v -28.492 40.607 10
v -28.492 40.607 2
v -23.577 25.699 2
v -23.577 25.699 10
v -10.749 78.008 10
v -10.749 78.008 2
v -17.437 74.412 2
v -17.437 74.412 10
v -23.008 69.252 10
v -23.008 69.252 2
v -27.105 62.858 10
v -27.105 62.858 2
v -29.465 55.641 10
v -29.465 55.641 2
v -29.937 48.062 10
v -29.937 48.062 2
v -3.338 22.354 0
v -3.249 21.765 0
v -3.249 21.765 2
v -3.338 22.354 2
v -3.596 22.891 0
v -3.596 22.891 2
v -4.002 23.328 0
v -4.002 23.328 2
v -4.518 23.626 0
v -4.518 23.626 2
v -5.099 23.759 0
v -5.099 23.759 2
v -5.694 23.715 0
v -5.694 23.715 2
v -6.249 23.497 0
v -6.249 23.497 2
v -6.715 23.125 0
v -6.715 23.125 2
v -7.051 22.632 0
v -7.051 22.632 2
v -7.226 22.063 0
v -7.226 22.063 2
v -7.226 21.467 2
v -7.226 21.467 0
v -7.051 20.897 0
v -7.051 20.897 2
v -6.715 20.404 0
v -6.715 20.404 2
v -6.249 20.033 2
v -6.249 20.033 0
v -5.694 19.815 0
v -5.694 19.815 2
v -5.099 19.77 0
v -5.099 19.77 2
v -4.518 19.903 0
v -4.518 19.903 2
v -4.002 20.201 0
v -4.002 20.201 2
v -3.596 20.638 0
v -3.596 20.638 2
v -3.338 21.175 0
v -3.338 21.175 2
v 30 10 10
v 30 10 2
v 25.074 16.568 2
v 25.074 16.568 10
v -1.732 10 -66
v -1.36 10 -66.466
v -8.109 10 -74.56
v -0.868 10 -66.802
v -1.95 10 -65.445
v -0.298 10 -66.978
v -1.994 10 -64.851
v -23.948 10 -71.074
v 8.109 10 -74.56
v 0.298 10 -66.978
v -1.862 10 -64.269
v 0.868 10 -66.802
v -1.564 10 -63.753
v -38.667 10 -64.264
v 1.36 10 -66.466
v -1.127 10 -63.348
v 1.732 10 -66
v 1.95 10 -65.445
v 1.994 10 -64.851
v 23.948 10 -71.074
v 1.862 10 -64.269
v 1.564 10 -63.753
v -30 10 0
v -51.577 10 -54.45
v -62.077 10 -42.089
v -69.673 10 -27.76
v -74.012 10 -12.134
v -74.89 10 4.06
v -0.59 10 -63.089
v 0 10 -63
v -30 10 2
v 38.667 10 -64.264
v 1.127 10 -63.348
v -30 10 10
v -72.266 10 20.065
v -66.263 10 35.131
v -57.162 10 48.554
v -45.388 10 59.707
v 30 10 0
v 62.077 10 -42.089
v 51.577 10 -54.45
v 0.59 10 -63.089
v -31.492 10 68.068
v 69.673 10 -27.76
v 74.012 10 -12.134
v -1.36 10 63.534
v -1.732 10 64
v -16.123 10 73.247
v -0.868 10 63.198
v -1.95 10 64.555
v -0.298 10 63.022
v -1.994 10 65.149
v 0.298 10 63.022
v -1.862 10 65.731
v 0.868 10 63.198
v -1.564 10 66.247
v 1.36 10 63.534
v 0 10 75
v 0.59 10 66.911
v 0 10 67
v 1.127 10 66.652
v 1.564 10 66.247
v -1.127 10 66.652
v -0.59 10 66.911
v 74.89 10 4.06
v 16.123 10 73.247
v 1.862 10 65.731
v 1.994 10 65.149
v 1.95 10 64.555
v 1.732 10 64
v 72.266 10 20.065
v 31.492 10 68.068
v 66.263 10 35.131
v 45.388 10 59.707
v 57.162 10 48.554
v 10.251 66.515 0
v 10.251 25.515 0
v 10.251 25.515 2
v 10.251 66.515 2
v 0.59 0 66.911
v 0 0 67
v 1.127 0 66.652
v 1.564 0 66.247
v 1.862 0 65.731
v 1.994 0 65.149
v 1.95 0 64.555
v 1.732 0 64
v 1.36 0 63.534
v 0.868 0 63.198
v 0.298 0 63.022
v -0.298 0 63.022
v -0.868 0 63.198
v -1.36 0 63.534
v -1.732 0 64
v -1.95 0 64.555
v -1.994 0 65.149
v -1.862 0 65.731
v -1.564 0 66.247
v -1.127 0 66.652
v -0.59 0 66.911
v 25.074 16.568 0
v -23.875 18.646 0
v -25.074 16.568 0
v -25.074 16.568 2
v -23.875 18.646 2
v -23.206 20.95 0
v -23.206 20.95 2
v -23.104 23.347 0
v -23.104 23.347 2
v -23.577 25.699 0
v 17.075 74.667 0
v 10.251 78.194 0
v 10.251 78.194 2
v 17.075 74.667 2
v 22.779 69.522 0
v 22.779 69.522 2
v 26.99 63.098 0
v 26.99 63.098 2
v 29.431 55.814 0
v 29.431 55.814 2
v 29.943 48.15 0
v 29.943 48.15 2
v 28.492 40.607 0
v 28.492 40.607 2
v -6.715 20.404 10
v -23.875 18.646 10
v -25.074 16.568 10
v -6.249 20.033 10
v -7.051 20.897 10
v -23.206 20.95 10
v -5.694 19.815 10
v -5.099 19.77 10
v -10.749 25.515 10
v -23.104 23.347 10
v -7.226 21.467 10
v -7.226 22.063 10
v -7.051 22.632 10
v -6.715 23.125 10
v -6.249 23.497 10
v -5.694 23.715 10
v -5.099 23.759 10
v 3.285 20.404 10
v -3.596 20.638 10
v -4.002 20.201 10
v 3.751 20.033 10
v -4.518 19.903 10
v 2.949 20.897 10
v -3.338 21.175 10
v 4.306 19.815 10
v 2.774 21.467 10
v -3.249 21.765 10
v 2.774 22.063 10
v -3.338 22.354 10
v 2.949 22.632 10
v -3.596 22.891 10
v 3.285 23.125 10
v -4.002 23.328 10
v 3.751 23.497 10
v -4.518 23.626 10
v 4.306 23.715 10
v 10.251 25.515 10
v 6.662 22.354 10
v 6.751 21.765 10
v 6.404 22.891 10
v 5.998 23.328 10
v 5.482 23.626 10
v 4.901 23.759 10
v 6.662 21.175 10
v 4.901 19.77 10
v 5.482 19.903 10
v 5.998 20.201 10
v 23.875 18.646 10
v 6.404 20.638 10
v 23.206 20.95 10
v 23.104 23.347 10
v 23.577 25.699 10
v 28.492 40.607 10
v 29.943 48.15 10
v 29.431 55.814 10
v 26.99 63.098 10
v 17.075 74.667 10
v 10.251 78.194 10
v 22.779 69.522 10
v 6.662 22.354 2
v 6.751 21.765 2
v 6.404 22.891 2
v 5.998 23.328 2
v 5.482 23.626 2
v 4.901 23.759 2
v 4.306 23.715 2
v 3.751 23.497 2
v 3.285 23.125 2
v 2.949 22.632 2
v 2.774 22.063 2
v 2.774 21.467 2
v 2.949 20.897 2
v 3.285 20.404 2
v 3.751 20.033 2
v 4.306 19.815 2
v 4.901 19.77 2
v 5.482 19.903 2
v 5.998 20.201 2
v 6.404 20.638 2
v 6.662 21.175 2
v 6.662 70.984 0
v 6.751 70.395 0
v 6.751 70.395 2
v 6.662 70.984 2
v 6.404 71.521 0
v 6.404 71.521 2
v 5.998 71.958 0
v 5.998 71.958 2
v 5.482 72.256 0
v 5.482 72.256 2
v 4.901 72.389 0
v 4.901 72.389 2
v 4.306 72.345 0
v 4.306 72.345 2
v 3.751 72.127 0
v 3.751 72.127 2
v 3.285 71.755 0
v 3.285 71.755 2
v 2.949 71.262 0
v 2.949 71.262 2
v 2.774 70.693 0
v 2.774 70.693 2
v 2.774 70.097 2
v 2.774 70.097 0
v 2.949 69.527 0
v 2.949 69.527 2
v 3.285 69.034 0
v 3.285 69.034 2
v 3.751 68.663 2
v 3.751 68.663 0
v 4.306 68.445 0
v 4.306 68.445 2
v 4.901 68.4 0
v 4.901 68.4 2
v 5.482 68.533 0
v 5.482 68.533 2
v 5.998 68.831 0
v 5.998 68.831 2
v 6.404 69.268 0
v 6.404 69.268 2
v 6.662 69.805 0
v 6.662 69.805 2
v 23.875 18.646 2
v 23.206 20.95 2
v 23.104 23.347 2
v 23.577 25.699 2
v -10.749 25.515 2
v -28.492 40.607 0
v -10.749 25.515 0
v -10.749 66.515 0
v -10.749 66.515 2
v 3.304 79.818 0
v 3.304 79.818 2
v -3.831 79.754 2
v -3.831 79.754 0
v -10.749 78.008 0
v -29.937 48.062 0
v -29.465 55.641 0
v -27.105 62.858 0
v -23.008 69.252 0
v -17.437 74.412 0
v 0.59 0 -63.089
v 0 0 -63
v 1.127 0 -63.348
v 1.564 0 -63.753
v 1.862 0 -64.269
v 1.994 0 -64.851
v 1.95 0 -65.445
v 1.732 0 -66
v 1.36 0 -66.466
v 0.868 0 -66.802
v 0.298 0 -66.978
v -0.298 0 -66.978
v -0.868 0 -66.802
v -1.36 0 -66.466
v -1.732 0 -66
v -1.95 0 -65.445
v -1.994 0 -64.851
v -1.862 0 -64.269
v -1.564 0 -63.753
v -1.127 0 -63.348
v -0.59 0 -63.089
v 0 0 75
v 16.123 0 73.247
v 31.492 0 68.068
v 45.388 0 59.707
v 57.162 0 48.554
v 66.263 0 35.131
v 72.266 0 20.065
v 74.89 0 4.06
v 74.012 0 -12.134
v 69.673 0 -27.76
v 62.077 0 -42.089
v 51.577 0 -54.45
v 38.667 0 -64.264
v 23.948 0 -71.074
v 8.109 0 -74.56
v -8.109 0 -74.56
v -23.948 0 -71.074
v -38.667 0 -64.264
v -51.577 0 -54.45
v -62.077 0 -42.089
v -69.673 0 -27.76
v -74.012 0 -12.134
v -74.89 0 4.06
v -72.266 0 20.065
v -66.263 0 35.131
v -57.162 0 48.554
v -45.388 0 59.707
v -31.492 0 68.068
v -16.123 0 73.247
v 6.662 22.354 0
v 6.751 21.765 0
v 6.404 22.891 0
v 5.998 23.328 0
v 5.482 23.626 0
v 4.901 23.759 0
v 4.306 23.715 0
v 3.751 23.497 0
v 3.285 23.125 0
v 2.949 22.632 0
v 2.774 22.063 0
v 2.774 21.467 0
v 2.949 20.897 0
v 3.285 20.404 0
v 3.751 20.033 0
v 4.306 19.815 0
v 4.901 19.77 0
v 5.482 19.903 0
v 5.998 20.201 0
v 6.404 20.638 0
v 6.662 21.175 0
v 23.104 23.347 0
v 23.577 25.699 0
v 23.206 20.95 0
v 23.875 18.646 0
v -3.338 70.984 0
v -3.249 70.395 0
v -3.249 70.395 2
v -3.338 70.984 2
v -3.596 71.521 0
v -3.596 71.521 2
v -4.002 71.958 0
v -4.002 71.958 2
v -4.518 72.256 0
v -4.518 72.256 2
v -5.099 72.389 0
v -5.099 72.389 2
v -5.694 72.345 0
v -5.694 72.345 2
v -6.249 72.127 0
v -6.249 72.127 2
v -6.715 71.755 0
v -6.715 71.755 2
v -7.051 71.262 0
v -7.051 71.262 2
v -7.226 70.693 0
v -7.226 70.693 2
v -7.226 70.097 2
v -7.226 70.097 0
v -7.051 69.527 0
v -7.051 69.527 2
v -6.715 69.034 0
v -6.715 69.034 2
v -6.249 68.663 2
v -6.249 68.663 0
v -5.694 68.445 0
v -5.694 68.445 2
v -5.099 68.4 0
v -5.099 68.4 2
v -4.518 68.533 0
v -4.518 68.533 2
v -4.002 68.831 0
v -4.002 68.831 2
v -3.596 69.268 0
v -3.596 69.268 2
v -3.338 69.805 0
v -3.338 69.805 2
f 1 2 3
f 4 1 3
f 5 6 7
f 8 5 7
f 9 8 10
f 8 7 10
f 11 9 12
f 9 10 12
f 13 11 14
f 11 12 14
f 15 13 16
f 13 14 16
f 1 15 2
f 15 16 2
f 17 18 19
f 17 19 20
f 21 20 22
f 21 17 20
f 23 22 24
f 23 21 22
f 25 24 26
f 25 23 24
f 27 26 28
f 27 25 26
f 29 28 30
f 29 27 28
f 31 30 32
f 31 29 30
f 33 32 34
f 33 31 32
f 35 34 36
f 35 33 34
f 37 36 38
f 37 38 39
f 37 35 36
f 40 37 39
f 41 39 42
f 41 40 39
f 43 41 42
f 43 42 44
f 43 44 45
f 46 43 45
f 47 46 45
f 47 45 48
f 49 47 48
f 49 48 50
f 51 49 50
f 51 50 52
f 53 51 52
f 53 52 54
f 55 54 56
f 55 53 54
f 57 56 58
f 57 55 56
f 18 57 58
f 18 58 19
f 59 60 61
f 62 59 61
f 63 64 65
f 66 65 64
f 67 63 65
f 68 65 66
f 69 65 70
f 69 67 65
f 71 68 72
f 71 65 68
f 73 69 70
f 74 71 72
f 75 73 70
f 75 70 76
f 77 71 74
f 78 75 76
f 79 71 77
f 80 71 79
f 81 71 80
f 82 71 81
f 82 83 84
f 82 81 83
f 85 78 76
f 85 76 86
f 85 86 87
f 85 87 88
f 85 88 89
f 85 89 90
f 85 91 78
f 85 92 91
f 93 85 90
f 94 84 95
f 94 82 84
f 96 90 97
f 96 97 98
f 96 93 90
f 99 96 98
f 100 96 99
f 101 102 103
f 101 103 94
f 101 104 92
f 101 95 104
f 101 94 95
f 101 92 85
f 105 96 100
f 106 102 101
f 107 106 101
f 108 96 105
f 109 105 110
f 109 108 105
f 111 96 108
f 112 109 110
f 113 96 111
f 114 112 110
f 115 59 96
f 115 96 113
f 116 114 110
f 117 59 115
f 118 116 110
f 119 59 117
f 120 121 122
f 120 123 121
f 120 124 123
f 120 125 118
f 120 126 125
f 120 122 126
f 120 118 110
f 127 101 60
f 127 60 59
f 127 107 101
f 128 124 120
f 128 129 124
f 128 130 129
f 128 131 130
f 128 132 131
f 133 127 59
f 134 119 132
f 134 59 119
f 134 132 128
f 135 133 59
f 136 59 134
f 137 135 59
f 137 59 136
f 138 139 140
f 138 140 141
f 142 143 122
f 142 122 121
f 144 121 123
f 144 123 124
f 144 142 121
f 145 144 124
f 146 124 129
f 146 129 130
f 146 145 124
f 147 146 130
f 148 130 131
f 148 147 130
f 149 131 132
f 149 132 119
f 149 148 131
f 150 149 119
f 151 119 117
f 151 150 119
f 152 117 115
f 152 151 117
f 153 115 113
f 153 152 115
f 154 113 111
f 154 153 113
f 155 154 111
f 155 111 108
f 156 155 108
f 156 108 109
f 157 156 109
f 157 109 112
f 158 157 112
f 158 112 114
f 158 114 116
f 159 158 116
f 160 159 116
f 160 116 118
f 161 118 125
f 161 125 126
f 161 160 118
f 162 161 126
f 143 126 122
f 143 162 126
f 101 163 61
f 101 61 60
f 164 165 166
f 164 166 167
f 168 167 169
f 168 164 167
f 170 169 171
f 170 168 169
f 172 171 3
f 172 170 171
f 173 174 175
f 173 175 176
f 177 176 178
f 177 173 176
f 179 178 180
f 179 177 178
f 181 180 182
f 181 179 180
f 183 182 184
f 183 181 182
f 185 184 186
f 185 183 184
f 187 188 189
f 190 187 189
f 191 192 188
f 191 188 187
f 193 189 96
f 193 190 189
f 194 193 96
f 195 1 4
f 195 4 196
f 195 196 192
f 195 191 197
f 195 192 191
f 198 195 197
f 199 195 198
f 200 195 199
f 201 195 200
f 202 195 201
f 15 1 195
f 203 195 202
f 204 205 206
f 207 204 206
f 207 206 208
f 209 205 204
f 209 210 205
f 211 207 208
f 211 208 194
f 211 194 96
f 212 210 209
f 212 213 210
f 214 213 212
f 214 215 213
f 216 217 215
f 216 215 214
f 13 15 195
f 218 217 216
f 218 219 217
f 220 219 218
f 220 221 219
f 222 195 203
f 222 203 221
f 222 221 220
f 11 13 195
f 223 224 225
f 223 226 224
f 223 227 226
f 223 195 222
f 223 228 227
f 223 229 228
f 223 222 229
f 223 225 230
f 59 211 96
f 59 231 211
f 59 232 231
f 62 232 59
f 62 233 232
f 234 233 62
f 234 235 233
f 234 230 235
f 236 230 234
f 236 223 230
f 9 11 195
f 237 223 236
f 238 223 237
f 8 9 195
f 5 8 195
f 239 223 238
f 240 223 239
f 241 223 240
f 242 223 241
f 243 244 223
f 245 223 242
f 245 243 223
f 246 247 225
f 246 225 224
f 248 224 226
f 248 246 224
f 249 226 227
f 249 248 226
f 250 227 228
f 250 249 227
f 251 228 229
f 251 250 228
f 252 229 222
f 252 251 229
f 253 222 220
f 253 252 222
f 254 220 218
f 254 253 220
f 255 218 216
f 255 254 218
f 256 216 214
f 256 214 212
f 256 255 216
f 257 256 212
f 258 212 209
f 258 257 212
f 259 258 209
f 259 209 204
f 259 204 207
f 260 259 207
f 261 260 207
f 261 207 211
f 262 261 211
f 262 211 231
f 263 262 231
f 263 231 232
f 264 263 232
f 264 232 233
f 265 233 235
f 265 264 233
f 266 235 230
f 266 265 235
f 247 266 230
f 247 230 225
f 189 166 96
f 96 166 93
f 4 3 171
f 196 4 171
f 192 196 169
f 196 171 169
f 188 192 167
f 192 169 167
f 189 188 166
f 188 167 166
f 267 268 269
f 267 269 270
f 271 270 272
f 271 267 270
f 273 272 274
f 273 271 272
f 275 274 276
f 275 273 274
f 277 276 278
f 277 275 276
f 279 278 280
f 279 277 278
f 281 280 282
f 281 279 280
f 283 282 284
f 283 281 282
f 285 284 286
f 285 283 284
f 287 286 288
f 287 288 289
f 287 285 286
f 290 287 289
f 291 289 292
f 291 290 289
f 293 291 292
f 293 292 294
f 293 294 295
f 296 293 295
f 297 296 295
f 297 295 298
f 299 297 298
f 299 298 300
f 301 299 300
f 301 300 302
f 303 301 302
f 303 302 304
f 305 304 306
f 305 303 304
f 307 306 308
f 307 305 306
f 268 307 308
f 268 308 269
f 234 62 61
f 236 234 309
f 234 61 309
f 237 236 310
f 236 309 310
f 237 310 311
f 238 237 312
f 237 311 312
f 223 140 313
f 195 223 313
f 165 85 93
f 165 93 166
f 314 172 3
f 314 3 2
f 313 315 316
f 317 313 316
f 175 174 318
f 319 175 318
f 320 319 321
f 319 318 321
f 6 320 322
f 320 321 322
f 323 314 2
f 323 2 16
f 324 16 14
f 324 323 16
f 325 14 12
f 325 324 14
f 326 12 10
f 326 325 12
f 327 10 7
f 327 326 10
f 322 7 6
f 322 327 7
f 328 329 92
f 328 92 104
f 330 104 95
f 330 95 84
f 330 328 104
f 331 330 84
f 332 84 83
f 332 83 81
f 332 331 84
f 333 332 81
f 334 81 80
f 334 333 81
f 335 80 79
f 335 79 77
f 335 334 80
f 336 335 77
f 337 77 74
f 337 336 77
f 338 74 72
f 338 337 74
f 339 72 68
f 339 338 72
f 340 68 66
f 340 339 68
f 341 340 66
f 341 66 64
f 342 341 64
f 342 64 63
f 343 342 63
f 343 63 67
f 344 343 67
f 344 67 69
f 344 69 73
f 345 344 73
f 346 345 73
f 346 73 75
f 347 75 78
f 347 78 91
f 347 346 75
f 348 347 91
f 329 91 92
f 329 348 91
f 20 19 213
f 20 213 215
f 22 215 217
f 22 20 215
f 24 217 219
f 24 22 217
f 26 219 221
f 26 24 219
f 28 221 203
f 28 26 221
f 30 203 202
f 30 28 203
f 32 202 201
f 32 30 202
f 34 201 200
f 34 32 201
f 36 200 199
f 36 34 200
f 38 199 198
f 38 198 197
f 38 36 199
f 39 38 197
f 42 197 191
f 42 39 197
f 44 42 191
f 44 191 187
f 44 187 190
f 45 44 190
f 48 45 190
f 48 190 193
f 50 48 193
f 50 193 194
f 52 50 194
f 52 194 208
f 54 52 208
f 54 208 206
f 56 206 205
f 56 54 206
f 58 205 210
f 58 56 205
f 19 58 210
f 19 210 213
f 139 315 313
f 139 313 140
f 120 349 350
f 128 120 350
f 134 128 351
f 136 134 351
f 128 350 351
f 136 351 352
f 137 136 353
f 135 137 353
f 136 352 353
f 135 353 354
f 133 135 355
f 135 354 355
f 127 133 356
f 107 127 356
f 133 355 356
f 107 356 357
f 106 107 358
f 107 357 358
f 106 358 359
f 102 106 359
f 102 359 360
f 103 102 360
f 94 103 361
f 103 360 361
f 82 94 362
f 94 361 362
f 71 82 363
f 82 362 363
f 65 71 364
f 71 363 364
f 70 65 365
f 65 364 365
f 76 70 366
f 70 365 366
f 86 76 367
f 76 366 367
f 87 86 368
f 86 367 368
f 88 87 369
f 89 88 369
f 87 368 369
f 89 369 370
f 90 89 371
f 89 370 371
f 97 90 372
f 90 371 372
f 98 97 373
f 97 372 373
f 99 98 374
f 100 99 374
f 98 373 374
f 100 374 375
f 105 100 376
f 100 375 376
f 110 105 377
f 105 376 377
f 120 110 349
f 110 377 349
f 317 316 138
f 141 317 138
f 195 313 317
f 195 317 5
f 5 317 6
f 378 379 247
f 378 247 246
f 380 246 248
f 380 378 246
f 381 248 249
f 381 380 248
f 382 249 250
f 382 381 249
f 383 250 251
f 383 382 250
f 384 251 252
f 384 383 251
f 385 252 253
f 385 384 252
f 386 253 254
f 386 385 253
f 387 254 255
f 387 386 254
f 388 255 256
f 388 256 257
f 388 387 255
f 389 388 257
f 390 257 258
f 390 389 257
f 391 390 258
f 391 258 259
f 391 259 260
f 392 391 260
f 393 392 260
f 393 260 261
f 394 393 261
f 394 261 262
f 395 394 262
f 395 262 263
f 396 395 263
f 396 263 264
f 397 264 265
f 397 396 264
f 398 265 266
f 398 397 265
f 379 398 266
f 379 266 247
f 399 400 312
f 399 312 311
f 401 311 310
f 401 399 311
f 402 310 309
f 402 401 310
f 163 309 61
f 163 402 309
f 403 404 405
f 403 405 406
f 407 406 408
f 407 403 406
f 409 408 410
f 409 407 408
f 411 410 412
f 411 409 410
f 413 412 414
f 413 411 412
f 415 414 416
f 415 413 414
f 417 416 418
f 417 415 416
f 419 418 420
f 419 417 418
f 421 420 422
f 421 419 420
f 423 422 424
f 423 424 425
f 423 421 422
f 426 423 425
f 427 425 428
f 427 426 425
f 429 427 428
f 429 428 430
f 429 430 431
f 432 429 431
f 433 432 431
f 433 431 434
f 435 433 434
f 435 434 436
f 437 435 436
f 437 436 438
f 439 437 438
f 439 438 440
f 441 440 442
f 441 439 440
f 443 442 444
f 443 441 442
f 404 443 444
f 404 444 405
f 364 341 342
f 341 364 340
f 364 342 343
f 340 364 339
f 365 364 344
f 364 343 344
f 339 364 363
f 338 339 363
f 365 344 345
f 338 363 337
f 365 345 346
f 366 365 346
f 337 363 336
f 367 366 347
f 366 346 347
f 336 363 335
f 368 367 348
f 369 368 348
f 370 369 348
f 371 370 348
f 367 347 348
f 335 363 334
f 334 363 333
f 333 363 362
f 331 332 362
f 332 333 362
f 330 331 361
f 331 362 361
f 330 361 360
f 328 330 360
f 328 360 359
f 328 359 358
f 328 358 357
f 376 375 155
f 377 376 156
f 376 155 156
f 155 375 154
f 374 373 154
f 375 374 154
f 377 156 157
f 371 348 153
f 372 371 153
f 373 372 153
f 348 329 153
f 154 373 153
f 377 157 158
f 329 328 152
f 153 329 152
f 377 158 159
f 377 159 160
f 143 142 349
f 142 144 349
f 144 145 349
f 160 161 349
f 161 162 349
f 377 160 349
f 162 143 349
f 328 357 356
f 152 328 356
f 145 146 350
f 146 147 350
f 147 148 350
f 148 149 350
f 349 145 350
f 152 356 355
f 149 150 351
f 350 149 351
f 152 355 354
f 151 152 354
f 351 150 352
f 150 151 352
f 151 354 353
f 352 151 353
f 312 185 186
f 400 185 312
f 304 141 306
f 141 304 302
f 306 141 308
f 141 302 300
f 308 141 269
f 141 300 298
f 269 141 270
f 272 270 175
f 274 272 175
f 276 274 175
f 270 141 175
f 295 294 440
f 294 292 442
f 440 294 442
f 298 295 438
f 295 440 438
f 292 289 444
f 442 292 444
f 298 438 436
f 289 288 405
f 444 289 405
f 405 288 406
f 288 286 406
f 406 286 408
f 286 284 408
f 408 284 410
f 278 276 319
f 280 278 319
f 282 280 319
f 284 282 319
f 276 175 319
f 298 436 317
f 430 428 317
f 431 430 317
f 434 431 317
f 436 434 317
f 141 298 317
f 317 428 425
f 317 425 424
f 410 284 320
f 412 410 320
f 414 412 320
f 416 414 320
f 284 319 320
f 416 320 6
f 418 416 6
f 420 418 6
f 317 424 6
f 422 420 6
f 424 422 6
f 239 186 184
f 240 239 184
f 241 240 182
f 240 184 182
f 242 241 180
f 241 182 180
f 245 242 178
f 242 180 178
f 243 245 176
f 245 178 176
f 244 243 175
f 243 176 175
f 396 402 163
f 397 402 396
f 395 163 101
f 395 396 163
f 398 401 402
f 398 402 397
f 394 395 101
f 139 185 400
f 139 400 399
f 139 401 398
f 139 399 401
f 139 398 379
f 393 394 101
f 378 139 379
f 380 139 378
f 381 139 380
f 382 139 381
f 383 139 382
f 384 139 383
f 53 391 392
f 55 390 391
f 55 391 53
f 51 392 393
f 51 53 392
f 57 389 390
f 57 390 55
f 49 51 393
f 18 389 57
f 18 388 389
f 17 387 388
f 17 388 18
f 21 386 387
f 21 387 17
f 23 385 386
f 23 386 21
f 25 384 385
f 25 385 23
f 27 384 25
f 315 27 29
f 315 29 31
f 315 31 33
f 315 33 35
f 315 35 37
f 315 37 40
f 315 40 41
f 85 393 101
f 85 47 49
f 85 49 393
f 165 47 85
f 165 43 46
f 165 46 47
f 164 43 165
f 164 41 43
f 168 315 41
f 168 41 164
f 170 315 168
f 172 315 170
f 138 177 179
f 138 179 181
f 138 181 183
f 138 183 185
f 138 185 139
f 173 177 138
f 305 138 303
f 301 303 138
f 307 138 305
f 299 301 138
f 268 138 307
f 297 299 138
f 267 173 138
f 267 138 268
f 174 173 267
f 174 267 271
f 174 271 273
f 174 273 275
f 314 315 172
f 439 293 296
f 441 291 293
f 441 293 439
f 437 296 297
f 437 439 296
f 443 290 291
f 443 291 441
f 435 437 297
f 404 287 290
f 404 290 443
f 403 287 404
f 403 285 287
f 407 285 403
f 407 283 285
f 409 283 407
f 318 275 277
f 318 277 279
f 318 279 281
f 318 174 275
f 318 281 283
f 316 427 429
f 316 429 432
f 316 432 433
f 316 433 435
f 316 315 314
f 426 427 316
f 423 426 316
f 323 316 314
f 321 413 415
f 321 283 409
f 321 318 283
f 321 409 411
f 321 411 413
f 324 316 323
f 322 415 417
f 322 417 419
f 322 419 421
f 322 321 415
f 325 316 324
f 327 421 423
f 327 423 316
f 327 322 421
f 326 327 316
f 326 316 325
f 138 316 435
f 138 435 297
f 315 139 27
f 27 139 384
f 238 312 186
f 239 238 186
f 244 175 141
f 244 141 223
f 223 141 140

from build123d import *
from build123d.topology import SkipClean

# Parameters (mm, degrees)
ESQUISSE1_R        = 75
ESQUISSE1_R_2      = 2
BOSS_EXTRU_1_DEPTH = 10
ESQUISSE2_R        = 2
ESQUISSE2_W        = 21
ESQUISSE2_H        = 41
ESQUISSE2_H_2      = 6.85
BOSS_EXTRU_2_DEPTH = 2
BOSS_EXTRU_5_START = 2
ESQUISSE2_7_R      = 2
BOSS_EXTRU_5_DEPTH = 8


with BuildPart() as part:
    # Esquisse1 → Boss.-Extru.1 (new body)
    with BuildSketch(Plane(origin=(0, 0, 0), x_dir=(1, 0, 0), z_dir=(0, 1, 0))):
        with Locations(Location((0, 0, 0), (0, 0, 270))):
            Circle(ESQUISSE1_R)
        with Locations(Location((0, 65, 0), (0, 0, 270))):
            Circle(ESQUISSE1_R_2, mode=Mode.SUBTRACT)
        with Locations(Location((0, -65, 0), (0, 0, 270))):
            Circle(ESQUISSE1_R_2, mode=Mode.SUBTRACT)
    extrude(amount=BOSS_EXTRU_1_DEPTH)

    # Esquisse2 → Boss.-Extru.2 (add)
    # profile 1 of 3: a face of its own
    with BuildSketch(Plane.XY):
        with BuildLine():
            ThreePointArc((-25.073934757, 16.568086991), (-23.205708304, 20.950030541), (-23.576750129, 25.699138596))
            Line((-23.576750129, 25.699138596), (-28.491553882, 40.606845184))
            ThreePointArc((-28.491553882, 40.606845184), (0, 80), (28.491553882, 40.606845184))
            Line((28.491553882, 40.606845184), (23.576750129, 25.699138596))
            ThreePointArc((23.576750129, 25.699138596), (23.205708304, 20.950030541), (25.073934757, 16.568086991))
            Line((25.073934757, 16.568086991), (30, 10))
            Line((30, 10), (-30, 10))
            Line((-30, 10), (-25.073934757, 16.568086991))
        make_face()
        with Locations((4.751288604, 21.76470447)):
            Circle(ESQUISSE2_R, mode=Mode.SUBTRACT)
        with Locations((-5.248711396, 21.76470447)):
            Circle(ESQUISSE2_R, mode=Mode.SUBTRACT)
        with Locations((-5.248711396, 70.39470447)):
            Circle(ESQUISSE2_R, mode=Mode.SUBTRACT)
        with Locations((4.751288604, 70.39470447)):
            Circle(ESQUISSE2_R, mode=Mode.SUBTRACT)
        with Locations((-0.248711396, 46.01543183)):
            Rectangle(ESQUISSE2_W, ESQUISSE2_H, mode=Mode.SUBTRACT)
    # profile 2 of 3: a face of its own
    with BuildSketch(Plane.XY):
        with Locations((-0.248711396, 69.94043183)):
            Rectangle(ESQUISSE2_W, ESQUISSE2_H_2)
        with Locations((-5.248711396, 70.39470447)):
            Circle(ESQUISSE2_R, mode=Mode.SUBTRACT)
        with Locations((4.751288604, 70.39470447)):
            Circle(ESQUISSE2_R, mode=Mode.SUBTRACT)
    # profile 3 of 3: a face of its own
    with BuildSketch(Plane.XY):
        with BuildLine():
            Line((10.251288604, 73.36543183), (10.251288604, 78.194167517))
            ThreePointArc((10.251288604, 78.194167517), (-0.265506097, 79.998825086), (-10.748711396, 78.00830597))
            Line((-10.748711396, 78.00830597), (-10.748711396, 73.36543183))
            Line((-10.748711396, 73.36543183), (10.251288604, 73.36543183))
        make_face()
    extrude(amount=BOSS_EXTRU_2_DEPTH)

    # Esquisse2<7> → Boss.-Extru.5 (add)
    with SkipClean():  # the faces are left unmerged after this step: merging them gives an invalid solid
        with BuildSketch(Plane.XY.offset(BOSS_EXTRU_5_START)):
            with BuildLine():
                Line((23.576750129, 25.699138596), (28.491553882, 40.606845184))
                ThreePointArc((28.491553882, 40.606845184), (26.989880715, 63.097569965), (10.251288604, 78.194167517))
                Line((10.251288604, 78.194167517), (10.251288604, 73.36543183))
                Line((10.251288604, 73.36543183), (10.251288604, 66.51543183))
                Line((10.251288604, 66.51543183), (10.251288604, 25.51543183))
                Line((10.251288604, 25.51543183), (-10.748711396, 25.51543183))
                Line((-10.748711396, 25.51543183), (-10.748711396, 66.51543183))
                Line((-10.748711396, 66.51543183), (-10.748711396, 73.36543183))
                Line((-10.748711396, 73.36543183), (-10.748711396, 78.00830597))
                ThreePointArc((-10.748711396, 78.00830597), (-27.104739844, 62.858191085), (-28.491553882, 40.606845184))
                Line((-28.491553882, 40.606845184), (-23.576750129, 25.699138596))
                ThreePointArc((-23.576750129, 25.699138596), (-23.205708304, 20.950030541), (-25.073934757, 16.568086991))
                Line((-25.073934757, 16.568086991), (-30, 10))
                Line((-30, 10), (30, 10))
                Line((30, 10), (25.073934757, 16.568086991))
                ThreePointArc((25.073934757, 16.568086991), (23.205708304, 20.950030541), (23.576750129, 25.699138596))
            make_face()
            with Locations((-5.248711396, 21.76470447)):
                Circle(ESQUISSE2_7_R, mode=Mode.SUBTRACT)
            with Locations((4.751288604, 21.76470447)):
                Circle(ESQUISSE2_7_R, mode=Mode.SUBTRACT)
        extrude(amount=BOSS_EXTRU_5_DEPTH)


solid = part.part
